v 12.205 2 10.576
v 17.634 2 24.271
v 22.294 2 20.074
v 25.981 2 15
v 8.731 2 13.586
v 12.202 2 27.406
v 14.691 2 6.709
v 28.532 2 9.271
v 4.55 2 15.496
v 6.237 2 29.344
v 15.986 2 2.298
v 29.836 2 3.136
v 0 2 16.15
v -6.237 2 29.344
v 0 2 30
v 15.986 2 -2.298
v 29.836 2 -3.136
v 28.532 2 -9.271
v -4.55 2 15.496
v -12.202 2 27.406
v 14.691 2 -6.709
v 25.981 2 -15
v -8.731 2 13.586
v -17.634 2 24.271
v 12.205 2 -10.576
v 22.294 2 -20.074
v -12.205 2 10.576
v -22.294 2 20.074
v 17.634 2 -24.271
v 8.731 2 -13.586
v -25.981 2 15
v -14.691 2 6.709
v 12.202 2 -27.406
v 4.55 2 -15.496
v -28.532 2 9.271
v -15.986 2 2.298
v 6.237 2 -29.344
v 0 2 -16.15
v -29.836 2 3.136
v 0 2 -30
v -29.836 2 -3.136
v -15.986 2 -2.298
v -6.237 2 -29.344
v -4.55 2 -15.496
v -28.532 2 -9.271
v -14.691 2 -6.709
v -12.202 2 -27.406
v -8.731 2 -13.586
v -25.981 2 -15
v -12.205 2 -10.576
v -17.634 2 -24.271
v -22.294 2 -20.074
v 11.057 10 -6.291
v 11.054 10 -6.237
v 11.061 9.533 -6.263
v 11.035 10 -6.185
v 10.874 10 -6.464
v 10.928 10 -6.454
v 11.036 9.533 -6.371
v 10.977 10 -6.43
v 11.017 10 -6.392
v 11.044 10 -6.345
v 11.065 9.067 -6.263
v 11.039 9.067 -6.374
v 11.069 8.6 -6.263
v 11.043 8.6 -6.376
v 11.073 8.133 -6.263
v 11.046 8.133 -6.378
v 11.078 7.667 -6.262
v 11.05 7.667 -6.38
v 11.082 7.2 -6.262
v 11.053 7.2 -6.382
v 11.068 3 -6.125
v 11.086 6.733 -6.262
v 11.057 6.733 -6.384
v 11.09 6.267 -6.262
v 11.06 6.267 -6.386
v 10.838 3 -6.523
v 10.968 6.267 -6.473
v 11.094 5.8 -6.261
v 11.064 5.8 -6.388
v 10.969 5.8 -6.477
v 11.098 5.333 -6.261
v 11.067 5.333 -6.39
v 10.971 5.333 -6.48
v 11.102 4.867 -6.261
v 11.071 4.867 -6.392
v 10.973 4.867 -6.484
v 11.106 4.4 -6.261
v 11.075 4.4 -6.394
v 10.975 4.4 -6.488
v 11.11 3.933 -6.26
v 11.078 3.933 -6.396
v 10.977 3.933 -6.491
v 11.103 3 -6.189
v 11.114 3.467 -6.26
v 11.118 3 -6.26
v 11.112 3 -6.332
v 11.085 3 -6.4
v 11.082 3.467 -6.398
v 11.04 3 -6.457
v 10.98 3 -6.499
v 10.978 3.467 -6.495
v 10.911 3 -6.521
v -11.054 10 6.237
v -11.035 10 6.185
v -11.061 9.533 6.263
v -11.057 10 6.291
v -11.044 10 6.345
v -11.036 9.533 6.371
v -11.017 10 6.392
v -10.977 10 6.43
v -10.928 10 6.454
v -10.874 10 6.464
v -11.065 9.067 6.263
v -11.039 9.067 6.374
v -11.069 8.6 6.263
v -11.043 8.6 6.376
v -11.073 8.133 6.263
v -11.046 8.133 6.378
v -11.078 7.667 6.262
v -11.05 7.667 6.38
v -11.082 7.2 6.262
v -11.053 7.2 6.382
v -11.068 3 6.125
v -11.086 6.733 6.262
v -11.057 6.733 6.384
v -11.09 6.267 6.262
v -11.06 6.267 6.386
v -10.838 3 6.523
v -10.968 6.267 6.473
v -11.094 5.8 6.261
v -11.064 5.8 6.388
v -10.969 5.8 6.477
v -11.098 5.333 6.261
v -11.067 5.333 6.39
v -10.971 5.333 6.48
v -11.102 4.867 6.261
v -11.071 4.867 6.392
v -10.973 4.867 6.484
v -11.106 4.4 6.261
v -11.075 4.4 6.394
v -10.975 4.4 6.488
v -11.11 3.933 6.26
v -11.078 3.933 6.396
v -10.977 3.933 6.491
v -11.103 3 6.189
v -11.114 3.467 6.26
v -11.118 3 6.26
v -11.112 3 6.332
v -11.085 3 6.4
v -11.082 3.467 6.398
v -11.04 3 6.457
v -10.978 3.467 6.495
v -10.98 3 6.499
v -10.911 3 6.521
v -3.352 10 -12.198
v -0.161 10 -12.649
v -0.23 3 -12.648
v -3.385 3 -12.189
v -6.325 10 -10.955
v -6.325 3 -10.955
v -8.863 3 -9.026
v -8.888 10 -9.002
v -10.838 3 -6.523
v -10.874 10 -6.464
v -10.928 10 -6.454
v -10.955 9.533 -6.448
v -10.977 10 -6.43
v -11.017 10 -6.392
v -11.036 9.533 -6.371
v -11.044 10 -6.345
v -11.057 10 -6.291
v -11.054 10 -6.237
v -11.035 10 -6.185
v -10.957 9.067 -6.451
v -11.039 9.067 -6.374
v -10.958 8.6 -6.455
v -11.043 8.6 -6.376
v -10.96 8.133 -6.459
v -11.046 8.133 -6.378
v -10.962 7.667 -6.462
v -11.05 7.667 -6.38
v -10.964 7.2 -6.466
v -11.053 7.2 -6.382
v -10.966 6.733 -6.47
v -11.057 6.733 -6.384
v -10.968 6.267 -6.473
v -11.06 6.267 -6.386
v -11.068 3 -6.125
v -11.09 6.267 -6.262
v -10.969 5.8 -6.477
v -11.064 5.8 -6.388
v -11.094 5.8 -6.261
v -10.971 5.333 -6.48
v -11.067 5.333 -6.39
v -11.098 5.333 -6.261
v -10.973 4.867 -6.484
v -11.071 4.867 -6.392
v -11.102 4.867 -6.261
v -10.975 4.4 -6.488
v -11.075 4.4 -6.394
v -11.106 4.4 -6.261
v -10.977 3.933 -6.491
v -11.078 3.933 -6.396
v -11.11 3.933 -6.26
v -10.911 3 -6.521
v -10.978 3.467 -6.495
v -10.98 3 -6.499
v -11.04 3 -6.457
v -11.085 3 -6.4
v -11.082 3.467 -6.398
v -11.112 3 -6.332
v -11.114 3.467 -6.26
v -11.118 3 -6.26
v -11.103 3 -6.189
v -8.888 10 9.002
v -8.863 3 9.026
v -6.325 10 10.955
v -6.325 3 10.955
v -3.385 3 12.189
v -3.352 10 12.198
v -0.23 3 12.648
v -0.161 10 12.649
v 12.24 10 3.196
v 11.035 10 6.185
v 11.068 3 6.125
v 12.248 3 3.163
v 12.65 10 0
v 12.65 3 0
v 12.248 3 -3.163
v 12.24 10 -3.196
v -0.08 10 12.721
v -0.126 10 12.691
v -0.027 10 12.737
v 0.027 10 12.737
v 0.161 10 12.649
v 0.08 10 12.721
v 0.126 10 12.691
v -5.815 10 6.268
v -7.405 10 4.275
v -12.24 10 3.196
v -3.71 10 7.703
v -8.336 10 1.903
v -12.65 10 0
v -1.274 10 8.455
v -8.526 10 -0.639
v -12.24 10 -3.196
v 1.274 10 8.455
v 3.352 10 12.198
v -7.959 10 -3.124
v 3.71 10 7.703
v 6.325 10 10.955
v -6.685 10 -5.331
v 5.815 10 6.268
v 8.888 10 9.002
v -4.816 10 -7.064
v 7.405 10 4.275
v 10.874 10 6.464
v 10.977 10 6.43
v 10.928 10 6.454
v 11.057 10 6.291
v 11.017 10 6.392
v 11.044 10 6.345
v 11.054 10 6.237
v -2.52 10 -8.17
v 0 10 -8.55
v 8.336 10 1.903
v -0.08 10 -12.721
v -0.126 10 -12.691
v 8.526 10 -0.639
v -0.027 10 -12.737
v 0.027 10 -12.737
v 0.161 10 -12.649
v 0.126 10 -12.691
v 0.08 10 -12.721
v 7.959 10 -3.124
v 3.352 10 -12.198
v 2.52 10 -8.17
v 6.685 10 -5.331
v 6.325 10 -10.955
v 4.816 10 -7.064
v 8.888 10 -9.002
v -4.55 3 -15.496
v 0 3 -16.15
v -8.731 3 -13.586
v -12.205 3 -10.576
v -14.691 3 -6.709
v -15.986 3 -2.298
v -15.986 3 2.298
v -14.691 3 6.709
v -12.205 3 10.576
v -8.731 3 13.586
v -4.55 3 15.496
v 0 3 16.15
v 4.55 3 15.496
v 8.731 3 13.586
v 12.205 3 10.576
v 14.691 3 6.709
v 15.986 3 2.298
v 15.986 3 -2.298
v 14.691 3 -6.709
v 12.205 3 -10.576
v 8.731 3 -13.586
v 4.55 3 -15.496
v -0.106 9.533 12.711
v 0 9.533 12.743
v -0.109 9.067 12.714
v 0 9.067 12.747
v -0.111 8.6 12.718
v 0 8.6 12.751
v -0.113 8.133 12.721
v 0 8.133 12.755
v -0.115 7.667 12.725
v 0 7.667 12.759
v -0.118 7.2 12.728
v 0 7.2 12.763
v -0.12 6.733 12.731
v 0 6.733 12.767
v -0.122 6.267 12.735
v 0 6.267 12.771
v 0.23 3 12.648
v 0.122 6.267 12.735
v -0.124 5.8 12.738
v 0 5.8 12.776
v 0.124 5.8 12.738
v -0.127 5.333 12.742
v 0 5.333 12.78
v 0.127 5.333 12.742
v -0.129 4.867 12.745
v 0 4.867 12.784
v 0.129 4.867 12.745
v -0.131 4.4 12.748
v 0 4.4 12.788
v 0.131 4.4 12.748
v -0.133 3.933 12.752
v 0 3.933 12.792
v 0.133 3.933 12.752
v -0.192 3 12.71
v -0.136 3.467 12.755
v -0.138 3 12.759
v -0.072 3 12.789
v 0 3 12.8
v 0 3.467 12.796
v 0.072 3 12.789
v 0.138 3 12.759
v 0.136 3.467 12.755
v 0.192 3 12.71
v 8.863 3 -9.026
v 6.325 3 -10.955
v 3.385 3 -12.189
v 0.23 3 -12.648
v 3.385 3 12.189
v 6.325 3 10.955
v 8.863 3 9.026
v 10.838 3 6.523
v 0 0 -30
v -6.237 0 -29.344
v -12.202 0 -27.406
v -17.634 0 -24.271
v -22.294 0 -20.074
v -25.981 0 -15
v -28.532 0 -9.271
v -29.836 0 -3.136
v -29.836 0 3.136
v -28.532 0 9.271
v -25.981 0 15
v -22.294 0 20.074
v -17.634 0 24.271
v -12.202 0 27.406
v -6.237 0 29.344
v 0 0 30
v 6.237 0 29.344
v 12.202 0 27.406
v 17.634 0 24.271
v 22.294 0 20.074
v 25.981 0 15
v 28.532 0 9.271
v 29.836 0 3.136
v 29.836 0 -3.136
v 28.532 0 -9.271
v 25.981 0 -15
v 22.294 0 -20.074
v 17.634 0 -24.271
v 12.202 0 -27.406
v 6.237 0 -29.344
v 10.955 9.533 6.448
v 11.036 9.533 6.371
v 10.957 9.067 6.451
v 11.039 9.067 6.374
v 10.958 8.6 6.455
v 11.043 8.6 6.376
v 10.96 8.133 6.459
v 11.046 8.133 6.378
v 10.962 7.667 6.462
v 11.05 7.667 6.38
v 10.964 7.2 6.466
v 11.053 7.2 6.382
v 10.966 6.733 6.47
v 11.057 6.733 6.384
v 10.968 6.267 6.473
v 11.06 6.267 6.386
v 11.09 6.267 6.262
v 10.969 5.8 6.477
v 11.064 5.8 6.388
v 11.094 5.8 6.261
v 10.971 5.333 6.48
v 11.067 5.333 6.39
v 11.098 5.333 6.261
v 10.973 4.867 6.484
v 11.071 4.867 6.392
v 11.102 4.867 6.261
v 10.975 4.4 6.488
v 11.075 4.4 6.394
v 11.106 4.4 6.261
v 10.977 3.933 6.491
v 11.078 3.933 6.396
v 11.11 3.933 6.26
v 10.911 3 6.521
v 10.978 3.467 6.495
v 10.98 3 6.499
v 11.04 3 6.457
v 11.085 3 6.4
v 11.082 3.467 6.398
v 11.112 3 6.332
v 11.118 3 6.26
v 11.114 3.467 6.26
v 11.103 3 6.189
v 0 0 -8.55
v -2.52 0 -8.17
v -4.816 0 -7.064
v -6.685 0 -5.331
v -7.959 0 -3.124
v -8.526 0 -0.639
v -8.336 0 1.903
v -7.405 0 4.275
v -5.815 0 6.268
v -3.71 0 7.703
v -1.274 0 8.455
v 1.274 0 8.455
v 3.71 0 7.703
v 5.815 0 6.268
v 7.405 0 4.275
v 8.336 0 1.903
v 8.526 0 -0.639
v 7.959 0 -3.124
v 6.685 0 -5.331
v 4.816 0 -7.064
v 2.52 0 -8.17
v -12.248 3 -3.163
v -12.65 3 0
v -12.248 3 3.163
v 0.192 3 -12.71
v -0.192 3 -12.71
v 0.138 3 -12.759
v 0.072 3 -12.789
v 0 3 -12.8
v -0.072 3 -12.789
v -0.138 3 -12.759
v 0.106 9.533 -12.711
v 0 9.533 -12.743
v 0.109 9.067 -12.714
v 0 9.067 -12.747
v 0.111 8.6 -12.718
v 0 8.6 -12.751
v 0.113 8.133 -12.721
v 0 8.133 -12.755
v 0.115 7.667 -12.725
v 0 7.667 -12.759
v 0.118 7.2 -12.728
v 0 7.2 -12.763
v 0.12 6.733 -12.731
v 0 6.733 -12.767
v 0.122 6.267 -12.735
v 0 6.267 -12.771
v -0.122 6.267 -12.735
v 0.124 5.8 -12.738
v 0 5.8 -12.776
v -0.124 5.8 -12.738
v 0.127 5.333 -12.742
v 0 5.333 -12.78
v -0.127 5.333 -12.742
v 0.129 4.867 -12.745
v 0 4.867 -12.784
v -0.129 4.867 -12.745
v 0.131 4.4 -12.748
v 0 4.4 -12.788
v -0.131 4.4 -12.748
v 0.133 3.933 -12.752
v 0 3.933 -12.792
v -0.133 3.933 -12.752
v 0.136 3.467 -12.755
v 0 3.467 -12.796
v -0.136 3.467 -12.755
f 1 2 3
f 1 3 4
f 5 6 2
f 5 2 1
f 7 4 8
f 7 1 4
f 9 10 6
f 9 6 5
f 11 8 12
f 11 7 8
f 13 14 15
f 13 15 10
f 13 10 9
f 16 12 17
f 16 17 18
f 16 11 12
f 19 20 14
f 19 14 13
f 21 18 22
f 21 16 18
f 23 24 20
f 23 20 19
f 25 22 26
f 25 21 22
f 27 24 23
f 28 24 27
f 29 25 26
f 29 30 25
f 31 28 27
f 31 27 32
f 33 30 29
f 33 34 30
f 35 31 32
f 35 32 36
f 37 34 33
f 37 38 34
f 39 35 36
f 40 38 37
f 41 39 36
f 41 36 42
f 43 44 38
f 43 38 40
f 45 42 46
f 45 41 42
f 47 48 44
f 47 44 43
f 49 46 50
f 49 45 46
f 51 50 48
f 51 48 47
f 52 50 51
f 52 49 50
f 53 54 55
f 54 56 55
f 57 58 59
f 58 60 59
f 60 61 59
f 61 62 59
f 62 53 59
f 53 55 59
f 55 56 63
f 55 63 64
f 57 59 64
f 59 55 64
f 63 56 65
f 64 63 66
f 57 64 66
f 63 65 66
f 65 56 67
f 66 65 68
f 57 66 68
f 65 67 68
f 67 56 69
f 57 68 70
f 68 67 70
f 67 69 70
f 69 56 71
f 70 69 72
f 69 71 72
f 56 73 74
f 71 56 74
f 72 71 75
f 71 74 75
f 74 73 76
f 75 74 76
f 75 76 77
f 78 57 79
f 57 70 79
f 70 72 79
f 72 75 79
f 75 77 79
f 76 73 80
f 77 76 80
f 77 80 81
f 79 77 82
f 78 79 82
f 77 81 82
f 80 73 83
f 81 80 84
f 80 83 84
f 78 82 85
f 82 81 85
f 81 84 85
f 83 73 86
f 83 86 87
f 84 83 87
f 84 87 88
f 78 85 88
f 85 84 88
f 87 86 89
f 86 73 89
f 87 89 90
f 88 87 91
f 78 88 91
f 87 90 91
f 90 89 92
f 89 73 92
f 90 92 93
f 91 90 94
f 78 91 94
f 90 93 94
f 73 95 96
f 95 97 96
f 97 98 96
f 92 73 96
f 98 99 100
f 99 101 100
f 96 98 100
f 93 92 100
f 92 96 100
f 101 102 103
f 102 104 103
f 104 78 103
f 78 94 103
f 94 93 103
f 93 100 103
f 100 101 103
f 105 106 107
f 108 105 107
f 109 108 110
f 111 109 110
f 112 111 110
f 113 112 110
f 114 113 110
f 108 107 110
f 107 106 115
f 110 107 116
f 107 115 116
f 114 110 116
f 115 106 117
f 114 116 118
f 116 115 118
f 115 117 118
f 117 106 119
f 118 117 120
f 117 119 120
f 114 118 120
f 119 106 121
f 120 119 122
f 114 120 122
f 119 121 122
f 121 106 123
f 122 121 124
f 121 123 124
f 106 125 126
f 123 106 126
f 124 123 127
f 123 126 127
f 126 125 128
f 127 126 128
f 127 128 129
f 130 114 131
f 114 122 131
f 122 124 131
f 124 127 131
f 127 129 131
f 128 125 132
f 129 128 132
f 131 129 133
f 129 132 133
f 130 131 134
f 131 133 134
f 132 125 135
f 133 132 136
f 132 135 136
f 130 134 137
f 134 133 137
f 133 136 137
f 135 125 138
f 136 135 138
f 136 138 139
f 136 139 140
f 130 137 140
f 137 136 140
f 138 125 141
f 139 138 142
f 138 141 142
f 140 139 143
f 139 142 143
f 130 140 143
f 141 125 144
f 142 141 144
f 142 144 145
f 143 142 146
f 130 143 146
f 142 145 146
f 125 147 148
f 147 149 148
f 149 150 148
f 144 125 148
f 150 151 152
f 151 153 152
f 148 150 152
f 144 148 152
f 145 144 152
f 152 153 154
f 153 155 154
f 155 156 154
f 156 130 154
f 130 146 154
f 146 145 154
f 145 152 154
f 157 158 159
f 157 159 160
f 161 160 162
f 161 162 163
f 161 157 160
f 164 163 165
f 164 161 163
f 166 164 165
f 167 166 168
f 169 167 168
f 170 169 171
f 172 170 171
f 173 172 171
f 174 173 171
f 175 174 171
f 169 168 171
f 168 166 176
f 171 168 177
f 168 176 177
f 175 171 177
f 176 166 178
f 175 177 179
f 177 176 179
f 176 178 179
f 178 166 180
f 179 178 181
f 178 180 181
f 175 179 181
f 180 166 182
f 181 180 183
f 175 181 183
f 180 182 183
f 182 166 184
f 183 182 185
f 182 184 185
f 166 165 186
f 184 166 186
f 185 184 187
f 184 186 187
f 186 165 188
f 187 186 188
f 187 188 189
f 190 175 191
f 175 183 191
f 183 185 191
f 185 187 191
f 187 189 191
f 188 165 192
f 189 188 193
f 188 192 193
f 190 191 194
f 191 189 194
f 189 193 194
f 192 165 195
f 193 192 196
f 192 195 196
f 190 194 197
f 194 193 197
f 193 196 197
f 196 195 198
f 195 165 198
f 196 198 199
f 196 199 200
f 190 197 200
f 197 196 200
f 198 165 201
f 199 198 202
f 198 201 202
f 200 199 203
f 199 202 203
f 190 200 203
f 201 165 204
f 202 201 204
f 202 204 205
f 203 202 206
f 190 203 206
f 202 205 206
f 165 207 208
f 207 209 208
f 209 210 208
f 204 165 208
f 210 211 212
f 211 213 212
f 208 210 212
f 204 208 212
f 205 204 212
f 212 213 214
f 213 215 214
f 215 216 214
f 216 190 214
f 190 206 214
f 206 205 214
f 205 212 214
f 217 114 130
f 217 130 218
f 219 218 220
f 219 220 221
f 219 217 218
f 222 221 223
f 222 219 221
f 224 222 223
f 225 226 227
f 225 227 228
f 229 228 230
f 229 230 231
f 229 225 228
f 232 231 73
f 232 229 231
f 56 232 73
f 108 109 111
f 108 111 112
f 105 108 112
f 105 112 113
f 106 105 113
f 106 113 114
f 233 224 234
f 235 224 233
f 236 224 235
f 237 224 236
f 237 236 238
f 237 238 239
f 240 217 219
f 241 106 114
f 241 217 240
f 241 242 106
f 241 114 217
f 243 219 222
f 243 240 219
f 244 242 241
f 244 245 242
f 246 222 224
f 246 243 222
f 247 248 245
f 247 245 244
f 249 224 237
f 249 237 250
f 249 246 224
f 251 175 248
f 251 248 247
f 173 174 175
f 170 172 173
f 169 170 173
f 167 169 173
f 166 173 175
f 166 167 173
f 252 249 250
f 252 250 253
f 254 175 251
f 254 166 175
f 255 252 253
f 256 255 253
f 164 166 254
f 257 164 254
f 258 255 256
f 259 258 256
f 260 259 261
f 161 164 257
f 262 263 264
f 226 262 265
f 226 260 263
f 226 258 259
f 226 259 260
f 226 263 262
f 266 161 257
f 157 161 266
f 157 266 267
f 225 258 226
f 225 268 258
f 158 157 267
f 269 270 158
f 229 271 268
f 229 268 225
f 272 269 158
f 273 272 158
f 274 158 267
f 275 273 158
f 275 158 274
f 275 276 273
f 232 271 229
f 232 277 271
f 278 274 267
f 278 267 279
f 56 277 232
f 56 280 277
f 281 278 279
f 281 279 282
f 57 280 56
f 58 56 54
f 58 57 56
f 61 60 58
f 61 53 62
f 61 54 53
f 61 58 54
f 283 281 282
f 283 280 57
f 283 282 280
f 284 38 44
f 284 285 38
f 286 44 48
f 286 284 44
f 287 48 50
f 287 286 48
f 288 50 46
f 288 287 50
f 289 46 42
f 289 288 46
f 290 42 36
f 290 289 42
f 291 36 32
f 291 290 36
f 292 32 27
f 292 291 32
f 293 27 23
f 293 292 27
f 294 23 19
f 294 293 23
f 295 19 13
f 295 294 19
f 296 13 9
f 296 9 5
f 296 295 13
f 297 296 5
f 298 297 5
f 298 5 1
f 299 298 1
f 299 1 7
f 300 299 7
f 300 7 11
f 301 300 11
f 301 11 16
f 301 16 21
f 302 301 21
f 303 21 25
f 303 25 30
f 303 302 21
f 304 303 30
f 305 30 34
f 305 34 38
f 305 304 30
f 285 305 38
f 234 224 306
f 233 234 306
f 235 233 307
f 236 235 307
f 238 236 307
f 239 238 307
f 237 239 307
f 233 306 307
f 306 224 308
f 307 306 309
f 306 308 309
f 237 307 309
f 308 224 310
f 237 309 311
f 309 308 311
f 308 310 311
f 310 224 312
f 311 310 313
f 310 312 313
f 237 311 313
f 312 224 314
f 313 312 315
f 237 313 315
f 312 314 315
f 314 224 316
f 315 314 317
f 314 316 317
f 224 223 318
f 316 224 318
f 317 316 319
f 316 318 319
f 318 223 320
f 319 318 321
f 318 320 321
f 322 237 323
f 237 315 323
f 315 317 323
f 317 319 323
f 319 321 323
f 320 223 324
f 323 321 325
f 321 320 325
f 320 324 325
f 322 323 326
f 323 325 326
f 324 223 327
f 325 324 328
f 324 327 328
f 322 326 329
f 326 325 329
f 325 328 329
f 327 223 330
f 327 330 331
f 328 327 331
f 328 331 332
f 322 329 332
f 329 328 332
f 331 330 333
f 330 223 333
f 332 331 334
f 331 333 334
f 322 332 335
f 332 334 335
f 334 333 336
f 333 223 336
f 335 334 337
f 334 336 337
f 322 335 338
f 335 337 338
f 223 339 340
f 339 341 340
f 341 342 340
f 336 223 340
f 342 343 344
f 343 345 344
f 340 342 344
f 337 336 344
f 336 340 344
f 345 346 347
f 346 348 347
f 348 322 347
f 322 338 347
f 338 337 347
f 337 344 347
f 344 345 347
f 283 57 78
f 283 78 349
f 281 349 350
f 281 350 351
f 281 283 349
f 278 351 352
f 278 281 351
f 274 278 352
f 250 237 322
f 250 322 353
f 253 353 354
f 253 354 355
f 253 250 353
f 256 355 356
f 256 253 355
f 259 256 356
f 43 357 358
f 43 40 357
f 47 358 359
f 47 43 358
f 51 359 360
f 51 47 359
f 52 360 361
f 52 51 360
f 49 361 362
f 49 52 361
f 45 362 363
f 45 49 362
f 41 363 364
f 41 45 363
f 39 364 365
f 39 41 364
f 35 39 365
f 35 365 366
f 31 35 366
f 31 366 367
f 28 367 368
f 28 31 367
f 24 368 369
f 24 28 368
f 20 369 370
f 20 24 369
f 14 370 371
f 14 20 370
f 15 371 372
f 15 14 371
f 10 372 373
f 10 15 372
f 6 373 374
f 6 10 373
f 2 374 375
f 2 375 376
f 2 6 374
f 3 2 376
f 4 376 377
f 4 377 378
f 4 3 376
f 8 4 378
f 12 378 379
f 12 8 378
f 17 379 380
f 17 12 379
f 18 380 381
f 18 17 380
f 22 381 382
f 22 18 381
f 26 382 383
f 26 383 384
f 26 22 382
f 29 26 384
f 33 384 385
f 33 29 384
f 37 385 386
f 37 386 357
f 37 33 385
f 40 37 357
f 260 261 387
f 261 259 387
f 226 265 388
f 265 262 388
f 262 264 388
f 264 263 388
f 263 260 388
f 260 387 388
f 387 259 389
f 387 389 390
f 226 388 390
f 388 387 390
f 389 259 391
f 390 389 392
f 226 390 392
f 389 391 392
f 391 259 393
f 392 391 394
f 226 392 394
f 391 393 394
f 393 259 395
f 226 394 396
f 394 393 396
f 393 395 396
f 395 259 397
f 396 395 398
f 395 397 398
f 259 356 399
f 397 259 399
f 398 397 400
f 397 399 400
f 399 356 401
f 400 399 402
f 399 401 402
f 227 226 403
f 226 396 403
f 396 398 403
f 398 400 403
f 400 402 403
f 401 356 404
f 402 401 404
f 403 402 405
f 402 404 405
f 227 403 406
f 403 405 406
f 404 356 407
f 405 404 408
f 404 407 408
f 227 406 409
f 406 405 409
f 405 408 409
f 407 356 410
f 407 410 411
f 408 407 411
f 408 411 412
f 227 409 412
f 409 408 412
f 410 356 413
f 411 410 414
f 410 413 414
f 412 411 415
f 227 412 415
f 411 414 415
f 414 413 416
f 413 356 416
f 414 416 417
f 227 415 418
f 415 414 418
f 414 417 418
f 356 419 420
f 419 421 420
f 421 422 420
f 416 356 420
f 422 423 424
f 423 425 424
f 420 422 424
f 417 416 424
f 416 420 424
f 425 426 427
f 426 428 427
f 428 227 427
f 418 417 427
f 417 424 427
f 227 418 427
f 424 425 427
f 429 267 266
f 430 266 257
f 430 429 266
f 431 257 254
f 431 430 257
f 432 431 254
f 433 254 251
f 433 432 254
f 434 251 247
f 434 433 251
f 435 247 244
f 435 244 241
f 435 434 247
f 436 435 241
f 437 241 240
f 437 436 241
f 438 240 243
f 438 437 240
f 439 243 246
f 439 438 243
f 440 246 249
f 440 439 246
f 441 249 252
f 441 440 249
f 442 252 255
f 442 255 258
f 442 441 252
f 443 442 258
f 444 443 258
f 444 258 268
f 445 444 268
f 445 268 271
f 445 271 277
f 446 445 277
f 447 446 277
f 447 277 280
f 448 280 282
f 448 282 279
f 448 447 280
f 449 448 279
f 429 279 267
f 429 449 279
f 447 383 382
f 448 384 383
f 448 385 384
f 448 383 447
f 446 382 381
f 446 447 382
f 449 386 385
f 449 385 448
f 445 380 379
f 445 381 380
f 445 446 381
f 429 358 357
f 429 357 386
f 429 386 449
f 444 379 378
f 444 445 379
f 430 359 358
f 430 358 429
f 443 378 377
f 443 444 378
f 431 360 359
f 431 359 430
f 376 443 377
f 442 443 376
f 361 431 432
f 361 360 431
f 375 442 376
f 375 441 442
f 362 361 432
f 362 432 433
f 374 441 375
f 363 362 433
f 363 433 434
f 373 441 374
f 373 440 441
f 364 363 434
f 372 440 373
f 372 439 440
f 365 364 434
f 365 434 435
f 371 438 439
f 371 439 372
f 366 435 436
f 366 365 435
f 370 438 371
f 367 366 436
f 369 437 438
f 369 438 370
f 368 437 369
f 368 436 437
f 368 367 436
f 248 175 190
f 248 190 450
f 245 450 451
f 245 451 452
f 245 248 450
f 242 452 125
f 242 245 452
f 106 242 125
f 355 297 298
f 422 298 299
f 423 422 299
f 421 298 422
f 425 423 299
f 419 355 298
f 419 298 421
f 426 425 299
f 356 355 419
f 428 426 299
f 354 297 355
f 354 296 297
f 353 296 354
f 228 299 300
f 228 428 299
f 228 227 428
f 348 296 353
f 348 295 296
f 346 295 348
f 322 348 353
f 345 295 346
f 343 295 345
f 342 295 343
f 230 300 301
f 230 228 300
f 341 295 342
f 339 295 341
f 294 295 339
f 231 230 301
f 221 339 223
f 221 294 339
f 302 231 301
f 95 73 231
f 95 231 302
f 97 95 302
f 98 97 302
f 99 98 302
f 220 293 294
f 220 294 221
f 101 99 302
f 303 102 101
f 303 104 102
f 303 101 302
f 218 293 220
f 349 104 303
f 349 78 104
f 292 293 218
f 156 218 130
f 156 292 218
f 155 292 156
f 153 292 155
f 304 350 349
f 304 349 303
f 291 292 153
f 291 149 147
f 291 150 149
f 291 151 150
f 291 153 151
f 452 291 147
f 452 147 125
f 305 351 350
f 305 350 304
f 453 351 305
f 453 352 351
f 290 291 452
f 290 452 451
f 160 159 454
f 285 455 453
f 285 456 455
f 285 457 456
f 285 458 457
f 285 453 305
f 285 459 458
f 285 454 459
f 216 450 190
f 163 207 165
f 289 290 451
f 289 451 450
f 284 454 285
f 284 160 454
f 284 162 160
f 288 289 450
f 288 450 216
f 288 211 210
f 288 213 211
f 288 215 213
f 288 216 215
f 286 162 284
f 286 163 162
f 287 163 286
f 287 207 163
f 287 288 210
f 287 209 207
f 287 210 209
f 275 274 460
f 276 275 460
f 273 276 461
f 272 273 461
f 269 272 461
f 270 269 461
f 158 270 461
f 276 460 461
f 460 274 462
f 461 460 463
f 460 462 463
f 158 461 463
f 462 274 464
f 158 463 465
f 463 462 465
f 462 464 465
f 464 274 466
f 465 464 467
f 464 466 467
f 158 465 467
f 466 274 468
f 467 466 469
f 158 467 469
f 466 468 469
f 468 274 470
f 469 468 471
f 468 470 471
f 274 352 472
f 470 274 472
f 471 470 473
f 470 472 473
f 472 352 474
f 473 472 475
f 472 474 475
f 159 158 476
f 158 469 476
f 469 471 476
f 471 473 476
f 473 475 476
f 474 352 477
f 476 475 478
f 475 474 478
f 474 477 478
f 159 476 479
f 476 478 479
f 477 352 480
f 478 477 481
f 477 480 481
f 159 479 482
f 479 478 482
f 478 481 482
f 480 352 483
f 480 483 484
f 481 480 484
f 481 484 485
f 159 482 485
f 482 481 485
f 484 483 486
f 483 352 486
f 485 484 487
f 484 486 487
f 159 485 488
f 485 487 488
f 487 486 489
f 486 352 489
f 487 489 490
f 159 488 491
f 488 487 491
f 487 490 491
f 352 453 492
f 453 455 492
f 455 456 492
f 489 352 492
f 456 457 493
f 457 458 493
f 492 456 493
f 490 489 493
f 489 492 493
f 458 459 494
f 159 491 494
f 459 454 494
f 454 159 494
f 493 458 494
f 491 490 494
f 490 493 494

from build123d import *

# Parameters (mm, degrees)
SKETCH3_R                     = 0.25
BOSS_EXTRUDE1_DEPTH           = 7
BOSS_EXTRUDE1_DRAFT           = 0.5
BOSS_EXTRUDE1_PROFILE_2_DEPTH = 7
BOSS_EXTRUDE1_PROFILE_2_DRAFT = 0.5
BOSS_EXTRUDE1_PROFILE_3_DEPTH = 7
BOSS_EXTRUDE1_PROFILE_3_DRAFT = 0.5
BOSS_EXTRUDE1_PROFILE_4_DEPTH = 7
BOSS_EXTRUDE1_PROFILE_4_DRAFT = 0.5
BOSS_EXTRUDE1_PROFILE_5_DEPTH = 7
BOSS_EXTRUDE1_PROFILE_5_DRAFT = 0.5
BOSS_EXTRUDE1_PROFILE_6_DEPTH = 7
BOSS_EXTRUDE1_PROFILE_6_DRAFT = 0.5


with BuildPart() as part:
    # Sketch2 → Revolve1 (revolve)
    with BuildSketch(Plane.XY, mode=Mode.PRIVATE) as revolve1_sk:
        Polygon((-8.55, 0), (-30, 0), (-30, 2), (-16.15, 2), (-16.15, 3), (-12.65, 3), (-12.65, 10), (-8.55, 10), align=None)
    revolve(revolve1_sk.sketch.rotate(Axis((0, 0, 0), (0, 1, 0)), 270), axis=Axis((0, 0, 0), (0, 1, 0)))


with BuildPart() as boss_extrude1_tool:
    # Sketch3 → Boss-Extrude1 (with draft: the straight prism first)
    with BuildSketch(Plane(origin=(0, 3, 0), x_dir=(1, 0, 0), z_dir=(0, 1, 0))):
        with Locations((0, 12.55)):
            Circle(SKETCH3_R)
    extrude(amount=BOSS_EXTRUDE1_DEPTH)
    # Boss-Extrude1: the draft: its side faces are tilted about the plane it starts from
    boss_extrude1_sides = [boss_extrude1_tool.faces().sort_by_distance(p)[0] for p in [
        (-0.25, 6.5, -12.55),
    ]]
    draft(boss_extrude1_sides, Plane(origin=(0, 3, 0), x_dir=(1, 0, 0), z_dir=(0, 1, 0)), BOSS_EXTRUDE1_DRAFT)


with BuildPart() as part_1:
    add(part.part)

    # Boss-Extrude1: add boss_extrude1_tool
    add(boss_extrude1_tool.part)


with BuildPart() as boss_extrude1_profile_2_tool:
    # Sketch3 → Boss-Extrude1 profile 2 (with draft: the straight prism first)
    with BuildSketch(Plane(origin=(0, 3, 0), x_dir=(1, 0, 0), z_dir=(0, 1, 0))):
        with Locations((10.868618817, 6.275)):
            Circle(SKETCH3_R)
    extrude(amount=BOSS_EXTRUDE1_PROFILE_2_DEPTH)
    # Boss-Extrude1 profile 2: the draft: its side faces are tilted about the plane it starts from
    boss_extrude1_profile_2_sides = [boss_extrude1_profile_2_tool.faces().sort_by_distance(p)[0] for p in [
        (10.618618817, 6.5, -6.275),
    ]]
    draft(boss_extrude1_profile_2_sides, Plane(origin=(0, 3, 0), x_dir=(1, 0, 0), z_dir=(0, 1, 0)), BOSS_EXTRUDE1_PROFILE_2_DRAFT)


with BuildPart() as part_2:
    add(part_1.part)

    # Boss-Extrude1 profile 2: add boss_extrude1_profile_2_tool
    add(boss_extrude1_profile_2_tool.part)


with BuildPart() as boss_extrude1_profile_3_tool:
    # Sketch3 → Boss-Extrude1 profile 3 (with draft: the straight prism first)
    with BuildSketch(Plane(origin=(0, 3, 0), x_dir=(1, 0, 0), z_dir=(0, 1, 0))):
        with Locations((10.868618817, -6.275)):
            Circle(SKETCH3_R)
    extrude(amount=BOSS_EXTRUDE1_PROFILE_3_DEPTH)
    # Boss-Extrude1 profile 3: the draft: its side faces are tilted about the plane it starts from
    boss_extrude1_profile_3_sides = [boss_extrude1_profile_3_tool.faces().sort_by_distance(p)[0] for p in [
        (10.618618817, 6.5, 6.275),
    ]]
    draft(boss_extrude1_profile_3_sides, Plane(origin=(0, 3, 0), x_dir=(1, 0, 0), z_dir=(0, 1, 0)), BOSS_EXTRUDE1_PROFILE_3_DRAFT)


with BuildPart() as part_3:
    add(part_2.part)

    # Boss-Extrude1 profile 3: add boss_extrude1_profile_3_tool
    add(boss_extrude1_profile_3_tool.part)


with BuildPart() as boss_extrude1_profile_4_tool:
    # Sketch3 → Boss-Extrude1 profile 4 (with draft: the straight prism first)
    with BuildSketch(Plane(origin=(0, 3, 0), x_dir=(1, 0, 0), z_dir=(0, 1, 0))):
        with Locations((0, -12.55)):
            Circle(SKETCH3_R)
    extrude(amount=BOSS_EXTRUDE1_PROFILE_4_DEPTH)
    # Boss-Extrude1 profile 4: the draft: its side faces are tilted about the plane it starts from
    boss_extrude1_profile_4_sides = [boss_extrude1_profile_4_tool.faces().sort_by_distance(p)[0] for p in [
        (-0.25, 6.5, 12.55),
    ]]
    draft(boss_extrude1_profile_4_sides, Plane(origin=(0, 3, 0), x_dir=(1, 0, 0), z_dir=(0, 1, 0)), BOSS_EXTRUDE1_PROFILE_4_DRAFT)


with BuildPart() as part_4:
    add(part_3.part)

    # Boss-Extrude1 profile 4: add boss_extrude1_profile_4_tool
    add(boss_extrude1_profile_4_tool.part)


with BuildPart() as boss_extrude1_profile_5_tool:
    # Sketch3 → Boss-Extrude1 profile 5 (with draft: the straight prism first)
    with BuildSketch(Plane(origin=(0, 3, 0), x_dir=(1, 0, 0), z_dir=(0, 1, 0))):
        with Locations((-10.868618817, -6.275)):
            Circle(SKETCH3_R)
    extrude(amount=BOSS_EXTRUDE1_PROFILE_5_DEPTH)
    # Boss-Extrude1 profile 5: the draft: its side faces are tilted about the plane it starts from
    boss_extrude1_profile_5_sides = [boss_extrude1_profile_5_tool.faces().sort_by_distance(p)[0] for p in [
        (-11.118618817, 6.5, 6.275),
    ]]
    draft(boss_extrude1_profile_5_sides, Plane(origin=(0, 3, 0), x_dir=(1, 0, 0), z_dir=(0, 1, 0)), BOSS_EXTRUDE1_PROFILE_5_DRAFT)


with BuildPart() as part_5:
    add(part_4.part)

    # Boss-Extrude1 profile 5: add boss_extrude1_profile_5_tool
    add(boss_extrude1_profile_5_tool.part)


with BuildPart() as boss_extrude1_profile_6_tool:
    # Sketch3 → Boss-Extrude1 profile 6 (with draft: the straight prism first)
    with BuildSketch(Plane(origin=(0, 3, 0), x_dir=(1, 0, 0), z_dir=(0, 1, 0))):
        with Locations((-10.868618817, 6.275)):
            Circle(SKETCH3_R)
    extrude(amount=BOSS_EXTRUDE1_PROFILE_6_DEPTH)
    # Boss-Extrude1 profile 6: the draft: its side faces are tilted about the plane it starts from
    boss_extrude1_profile_6_sides = [boss_extrude1_profile_6_tool.faces().sort_by_distance(p)[0] for p in [
        (-11.118618817, 6.5, -6.275),
    ]]
    draft(boss_extrude1_profile_6_sides, Plane(origin=(0, 3, 0), x_dir=(1, 0, 0), z_dir=(0, 1, 0)), BOSS_EXTRUDE1_PROFILE_6_DRAFT)


with BuildPart() as part_6:
    add(part_5.part)

    # Boss-Extrude1 profile 6: add boss_extrude1_profile_6_tool
    add(boss_extrude1_profile_6_tool.part)


solid = part_6.part
